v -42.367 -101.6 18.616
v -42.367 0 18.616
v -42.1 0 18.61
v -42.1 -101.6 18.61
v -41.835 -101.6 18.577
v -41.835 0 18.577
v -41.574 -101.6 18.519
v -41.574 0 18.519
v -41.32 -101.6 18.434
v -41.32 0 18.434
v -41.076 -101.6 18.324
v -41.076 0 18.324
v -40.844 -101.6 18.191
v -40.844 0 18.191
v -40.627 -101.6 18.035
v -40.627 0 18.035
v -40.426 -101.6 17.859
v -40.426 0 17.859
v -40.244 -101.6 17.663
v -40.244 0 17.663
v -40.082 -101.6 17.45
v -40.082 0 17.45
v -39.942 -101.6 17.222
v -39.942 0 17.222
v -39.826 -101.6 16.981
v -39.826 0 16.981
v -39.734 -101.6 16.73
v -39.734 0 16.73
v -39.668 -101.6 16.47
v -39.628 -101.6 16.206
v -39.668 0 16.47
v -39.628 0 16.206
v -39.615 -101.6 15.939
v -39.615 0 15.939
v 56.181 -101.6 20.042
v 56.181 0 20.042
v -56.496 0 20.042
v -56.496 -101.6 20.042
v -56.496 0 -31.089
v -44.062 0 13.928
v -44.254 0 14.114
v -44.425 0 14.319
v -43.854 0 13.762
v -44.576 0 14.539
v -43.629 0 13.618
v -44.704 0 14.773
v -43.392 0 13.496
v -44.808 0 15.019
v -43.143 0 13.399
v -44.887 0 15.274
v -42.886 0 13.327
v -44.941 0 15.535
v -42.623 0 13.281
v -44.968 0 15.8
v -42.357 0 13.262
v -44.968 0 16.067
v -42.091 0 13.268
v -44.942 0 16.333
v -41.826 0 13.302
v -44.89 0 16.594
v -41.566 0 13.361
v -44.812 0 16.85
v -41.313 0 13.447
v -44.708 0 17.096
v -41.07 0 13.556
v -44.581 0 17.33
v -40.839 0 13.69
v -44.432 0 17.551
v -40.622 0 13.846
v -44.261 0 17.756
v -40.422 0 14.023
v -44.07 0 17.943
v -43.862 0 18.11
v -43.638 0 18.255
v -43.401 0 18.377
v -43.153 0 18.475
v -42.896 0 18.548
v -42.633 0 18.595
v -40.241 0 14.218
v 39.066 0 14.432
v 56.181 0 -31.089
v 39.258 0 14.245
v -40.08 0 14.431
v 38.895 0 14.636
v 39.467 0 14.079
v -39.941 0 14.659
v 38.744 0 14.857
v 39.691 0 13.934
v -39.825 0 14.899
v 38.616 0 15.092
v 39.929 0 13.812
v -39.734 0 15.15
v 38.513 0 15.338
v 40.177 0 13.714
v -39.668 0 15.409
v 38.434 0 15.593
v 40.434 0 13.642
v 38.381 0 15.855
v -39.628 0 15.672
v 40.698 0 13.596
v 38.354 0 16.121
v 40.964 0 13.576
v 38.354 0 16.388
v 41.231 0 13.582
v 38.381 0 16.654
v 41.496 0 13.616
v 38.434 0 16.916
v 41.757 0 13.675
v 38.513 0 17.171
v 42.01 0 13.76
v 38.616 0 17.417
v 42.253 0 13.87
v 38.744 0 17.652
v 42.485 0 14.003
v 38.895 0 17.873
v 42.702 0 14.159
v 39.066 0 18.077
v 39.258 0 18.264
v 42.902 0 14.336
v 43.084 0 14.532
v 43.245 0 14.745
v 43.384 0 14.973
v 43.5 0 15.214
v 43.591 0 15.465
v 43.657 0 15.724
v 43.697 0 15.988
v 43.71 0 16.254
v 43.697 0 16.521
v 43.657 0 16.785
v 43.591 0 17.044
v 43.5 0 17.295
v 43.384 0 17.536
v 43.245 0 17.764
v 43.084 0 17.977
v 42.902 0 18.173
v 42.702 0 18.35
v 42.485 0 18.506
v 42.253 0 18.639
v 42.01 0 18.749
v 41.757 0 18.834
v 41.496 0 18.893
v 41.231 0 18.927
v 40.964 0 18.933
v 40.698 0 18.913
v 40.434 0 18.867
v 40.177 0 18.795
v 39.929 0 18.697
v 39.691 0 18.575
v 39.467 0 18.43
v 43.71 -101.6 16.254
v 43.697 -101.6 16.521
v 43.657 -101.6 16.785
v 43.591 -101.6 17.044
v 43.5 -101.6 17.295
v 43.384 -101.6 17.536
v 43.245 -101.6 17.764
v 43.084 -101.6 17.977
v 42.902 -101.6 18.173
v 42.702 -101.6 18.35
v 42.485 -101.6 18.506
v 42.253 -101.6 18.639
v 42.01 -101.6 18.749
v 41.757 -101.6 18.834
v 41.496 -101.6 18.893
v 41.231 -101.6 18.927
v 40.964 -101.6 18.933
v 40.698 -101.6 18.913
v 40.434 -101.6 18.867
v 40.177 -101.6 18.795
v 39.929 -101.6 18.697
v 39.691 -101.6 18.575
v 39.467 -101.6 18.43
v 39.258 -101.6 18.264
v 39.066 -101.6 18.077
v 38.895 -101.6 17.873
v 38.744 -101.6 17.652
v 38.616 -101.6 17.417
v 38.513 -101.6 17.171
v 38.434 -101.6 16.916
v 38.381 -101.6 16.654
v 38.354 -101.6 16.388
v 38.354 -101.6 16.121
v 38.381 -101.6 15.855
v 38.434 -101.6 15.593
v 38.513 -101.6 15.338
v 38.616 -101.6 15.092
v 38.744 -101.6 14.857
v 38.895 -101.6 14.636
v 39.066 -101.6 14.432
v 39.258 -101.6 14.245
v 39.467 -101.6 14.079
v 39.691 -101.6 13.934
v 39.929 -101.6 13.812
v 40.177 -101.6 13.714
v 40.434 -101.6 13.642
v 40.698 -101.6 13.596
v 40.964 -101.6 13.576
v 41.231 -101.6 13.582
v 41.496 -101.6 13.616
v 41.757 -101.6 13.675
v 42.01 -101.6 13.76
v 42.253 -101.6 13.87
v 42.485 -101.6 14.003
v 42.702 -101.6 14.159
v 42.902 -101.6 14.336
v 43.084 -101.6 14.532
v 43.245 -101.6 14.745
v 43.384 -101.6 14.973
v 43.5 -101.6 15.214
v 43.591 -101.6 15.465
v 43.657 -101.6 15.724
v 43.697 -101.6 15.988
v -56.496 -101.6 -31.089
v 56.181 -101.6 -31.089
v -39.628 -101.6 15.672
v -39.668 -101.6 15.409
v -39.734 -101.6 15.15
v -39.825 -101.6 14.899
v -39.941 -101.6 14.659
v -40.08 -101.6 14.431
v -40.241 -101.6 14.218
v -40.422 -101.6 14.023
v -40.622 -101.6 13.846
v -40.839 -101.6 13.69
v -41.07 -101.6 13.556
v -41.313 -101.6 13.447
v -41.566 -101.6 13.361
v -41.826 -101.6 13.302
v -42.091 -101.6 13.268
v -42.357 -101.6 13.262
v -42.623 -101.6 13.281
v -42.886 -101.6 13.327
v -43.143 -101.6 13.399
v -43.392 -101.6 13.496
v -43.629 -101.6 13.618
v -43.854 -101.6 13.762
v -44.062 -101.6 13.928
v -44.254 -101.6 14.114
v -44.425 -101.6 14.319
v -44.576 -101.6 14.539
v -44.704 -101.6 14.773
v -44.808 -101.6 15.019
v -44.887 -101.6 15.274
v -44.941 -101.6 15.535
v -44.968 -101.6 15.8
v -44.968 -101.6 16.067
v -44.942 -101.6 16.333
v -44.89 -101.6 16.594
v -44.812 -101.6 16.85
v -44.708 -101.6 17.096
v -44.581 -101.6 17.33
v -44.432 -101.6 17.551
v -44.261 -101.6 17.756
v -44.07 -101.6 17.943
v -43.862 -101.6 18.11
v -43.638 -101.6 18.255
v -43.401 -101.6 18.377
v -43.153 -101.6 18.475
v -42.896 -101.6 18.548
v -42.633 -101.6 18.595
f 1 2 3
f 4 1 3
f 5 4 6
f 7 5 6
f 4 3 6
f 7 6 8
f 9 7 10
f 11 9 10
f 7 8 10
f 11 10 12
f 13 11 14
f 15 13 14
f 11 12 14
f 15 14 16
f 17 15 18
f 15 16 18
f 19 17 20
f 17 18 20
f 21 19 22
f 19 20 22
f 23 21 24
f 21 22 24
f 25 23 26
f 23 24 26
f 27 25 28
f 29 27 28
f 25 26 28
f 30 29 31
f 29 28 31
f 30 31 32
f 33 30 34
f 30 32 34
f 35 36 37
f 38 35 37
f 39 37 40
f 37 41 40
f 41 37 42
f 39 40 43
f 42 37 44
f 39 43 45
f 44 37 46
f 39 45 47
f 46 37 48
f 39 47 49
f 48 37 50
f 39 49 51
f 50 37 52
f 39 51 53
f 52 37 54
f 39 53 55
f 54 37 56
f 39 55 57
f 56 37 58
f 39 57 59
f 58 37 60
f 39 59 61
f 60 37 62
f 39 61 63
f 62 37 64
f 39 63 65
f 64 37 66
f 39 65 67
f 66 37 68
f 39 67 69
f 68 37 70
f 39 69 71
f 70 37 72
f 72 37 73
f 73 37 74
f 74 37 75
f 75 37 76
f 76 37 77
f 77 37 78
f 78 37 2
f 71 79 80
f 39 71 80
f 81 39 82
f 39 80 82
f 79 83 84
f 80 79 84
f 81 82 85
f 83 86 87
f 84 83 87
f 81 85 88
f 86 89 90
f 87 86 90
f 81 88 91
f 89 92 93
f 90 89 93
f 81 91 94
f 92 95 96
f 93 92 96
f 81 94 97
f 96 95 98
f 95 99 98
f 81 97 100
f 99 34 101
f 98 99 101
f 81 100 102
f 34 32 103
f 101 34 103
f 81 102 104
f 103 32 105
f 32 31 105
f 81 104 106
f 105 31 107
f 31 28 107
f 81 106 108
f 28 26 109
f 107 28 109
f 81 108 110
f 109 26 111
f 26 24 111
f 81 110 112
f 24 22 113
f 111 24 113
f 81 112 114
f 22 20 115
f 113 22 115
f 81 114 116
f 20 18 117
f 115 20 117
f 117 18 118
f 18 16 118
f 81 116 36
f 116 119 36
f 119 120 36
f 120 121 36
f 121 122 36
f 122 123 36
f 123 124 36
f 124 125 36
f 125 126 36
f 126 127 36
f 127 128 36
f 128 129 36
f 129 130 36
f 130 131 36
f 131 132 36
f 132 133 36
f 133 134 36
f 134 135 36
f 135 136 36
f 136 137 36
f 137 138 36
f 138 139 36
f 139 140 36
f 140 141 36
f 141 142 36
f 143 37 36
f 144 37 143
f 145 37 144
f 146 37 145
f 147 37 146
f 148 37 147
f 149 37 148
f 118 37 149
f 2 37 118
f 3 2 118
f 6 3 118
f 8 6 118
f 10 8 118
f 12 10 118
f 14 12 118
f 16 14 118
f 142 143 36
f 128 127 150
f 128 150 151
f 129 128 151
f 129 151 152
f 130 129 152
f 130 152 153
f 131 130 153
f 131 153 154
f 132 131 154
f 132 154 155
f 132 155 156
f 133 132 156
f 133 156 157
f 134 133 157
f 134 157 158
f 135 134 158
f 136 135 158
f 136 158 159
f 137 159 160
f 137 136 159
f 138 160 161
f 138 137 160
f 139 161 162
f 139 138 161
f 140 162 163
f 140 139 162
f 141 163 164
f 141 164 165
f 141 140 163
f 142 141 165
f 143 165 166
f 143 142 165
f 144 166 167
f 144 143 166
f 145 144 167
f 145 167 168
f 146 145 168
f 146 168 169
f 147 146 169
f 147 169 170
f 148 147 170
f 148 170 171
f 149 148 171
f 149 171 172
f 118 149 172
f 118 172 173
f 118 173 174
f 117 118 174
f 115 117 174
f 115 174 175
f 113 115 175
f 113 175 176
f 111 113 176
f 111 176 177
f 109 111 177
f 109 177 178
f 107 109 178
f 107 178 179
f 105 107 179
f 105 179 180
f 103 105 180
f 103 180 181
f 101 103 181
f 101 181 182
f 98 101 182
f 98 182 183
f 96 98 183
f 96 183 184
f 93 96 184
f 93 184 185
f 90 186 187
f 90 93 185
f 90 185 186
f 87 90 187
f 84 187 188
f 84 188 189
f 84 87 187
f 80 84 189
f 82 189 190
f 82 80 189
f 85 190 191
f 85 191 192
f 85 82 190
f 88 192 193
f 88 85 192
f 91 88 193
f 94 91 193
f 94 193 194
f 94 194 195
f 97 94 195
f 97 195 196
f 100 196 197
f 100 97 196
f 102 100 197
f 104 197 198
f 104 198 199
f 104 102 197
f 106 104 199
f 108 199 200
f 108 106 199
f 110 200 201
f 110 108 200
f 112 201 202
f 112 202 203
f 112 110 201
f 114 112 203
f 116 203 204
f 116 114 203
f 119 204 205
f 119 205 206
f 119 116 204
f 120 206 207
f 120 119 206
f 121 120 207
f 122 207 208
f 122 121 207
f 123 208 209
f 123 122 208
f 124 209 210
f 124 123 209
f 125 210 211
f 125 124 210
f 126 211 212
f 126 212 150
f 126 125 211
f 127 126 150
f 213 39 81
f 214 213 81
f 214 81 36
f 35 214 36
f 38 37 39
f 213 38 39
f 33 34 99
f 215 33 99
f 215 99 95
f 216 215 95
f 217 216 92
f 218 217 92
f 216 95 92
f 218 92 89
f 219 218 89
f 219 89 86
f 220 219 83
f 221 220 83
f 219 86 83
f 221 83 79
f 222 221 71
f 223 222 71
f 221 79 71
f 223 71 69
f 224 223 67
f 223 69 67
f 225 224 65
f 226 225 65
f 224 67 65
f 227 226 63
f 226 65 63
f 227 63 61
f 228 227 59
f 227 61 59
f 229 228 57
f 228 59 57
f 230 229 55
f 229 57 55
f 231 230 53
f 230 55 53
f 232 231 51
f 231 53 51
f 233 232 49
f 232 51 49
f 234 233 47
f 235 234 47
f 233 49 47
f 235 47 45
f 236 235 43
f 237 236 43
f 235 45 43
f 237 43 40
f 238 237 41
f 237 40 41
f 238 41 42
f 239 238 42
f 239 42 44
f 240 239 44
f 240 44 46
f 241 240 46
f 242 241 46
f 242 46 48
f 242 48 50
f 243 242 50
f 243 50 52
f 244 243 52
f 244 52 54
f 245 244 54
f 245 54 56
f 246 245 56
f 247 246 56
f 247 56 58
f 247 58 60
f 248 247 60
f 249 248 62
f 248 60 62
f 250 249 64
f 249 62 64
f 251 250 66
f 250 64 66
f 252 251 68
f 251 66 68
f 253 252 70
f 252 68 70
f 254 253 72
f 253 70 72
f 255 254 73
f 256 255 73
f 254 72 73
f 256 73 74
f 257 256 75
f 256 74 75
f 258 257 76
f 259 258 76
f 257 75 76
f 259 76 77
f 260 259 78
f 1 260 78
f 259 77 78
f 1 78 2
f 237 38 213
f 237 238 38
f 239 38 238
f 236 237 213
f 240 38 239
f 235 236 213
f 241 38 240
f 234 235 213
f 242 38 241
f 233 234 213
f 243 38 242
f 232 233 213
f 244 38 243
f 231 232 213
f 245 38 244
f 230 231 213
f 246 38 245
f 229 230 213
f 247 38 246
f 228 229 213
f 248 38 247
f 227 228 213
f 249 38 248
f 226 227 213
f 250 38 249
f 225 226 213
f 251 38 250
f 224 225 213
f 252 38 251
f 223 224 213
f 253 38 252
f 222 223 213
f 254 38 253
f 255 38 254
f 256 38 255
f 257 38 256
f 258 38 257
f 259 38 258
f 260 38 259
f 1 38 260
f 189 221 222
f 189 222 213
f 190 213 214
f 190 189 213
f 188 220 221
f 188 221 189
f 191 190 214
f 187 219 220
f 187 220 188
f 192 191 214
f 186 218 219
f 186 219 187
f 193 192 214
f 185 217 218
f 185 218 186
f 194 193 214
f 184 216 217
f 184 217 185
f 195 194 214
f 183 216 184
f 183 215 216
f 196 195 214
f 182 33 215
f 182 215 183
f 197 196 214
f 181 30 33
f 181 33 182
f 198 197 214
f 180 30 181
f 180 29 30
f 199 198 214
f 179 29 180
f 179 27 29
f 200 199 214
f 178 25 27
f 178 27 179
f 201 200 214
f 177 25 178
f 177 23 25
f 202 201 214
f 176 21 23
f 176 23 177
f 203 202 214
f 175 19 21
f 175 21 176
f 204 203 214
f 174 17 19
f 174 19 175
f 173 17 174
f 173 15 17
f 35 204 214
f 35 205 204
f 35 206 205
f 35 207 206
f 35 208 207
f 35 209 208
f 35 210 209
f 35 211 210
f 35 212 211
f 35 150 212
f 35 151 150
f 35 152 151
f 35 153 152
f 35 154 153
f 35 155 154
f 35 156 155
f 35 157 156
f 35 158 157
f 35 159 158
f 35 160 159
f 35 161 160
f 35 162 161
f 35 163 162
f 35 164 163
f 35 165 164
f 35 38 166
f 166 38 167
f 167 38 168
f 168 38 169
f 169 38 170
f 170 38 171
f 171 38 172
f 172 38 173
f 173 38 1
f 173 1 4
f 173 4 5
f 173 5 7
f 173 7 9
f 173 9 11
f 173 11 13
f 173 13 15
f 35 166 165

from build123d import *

# Parameters (mm, degrees)
F0_R     = 2.6797
F1_DEPTH = 3.175
F2_DEPTH = 101.6


with BuildPart() as f1:
    # F0 (on Front) → F1 (new body)
    with BuildSketch(Plane.XZ):
        Polygon((-42.367362, 20.041954), (-56.496214, 20.041954), (-56.496214, -31.088697), (56.180589, -31.088697), (56.180589, 20.041954), align=None)
        with BuildLine():
            ThreePointArc((-39.614944, 15.938879), (-44.160357, 14.019069), (-42.367362, 18.615984))
            ThreePointArc((-42.367362, 18.615984), (-40.425799, 17.85869), (-39.614944, 15.938879))
        make_face(mode=Mode.SUBTRACT)
        with Locations((41.030772, 16.254498)):
            Circle(F0_R, mode=Mode.SUBTRACT)
    extrude(amount=F1_DEPTH)

    # F0 (on Front) → F2 (join)
    with BuildSketch(Plane.XZ):
        Polygon((-42.367362, 20.041954), (-56.496214, 20.041954), (-56.496214, -31.088697), (56.180589, -31.088697), (56.180589, 20.041954), align=None)
        with BuildLine():
            ThreePointArc((-39.614944, 15.938879), (-44.160357, 14.019069), (-42.367362, 18.615984))
            ThreePointArc((-42.367362, 18.615984), (-40.425799, 17.85869), (-39.614944, 15.938879))
        make_face(mode=Mode.SUBTRACT)
        with Locations((41.030772, 16.254498)):
            Circle(F0_R, mode=Mode.SUBTRACT)
    extrude(amount=F2_DEPTH)


solid = f1.part
